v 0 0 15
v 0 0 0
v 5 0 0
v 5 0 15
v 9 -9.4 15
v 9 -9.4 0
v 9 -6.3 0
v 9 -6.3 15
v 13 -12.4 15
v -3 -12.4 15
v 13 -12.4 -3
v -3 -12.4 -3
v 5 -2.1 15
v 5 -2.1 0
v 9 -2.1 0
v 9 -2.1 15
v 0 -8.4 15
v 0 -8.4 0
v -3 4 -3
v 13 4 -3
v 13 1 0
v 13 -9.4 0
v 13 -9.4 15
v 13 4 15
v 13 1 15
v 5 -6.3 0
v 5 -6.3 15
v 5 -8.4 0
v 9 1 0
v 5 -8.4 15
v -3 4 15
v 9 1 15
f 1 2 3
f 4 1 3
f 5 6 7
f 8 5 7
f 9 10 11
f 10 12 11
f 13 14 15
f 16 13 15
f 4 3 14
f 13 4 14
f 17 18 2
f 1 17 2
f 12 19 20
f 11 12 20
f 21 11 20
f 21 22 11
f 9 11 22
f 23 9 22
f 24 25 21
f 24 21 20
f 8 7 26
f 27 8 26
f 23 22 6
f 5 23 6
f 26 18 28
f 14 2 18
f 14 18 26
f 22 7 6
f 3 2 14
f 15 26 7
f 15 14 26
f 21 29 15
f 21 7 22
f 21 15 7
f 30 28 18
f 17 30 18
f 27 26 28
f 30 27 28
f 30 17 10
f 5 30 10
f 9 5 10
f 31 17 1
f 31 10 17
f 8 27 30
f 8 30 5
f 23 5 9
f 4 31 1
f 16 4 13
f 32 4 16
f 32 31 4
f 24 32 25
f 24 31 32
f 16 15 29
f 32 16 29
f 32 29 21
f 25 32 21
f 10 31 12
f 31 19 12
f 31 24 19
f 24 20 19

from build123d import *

# Parameters (mm, degrees)
F0_W     = 3
F0_H     = 8.4
F1_DEPTH = 3
F2_DEPTH = 15


with BuildPart() as f1:
    # F0 (on Top) → F1 (new body)
    with BuildSketch(Plane.XY):
        Polygon((-3, 0), (0, 0), (5, 0), (5, -2.1), (9, -2.1), (9, 1), (13, 1), (13, 4), (-3, 4), align=None)
        with Locations((-1.5, -4.2)):
            Rectangle(F0_W, F0_H)
        Polygon((5, -8.4), (0, -8.4), (-3, -8.4), (-3, -12.4), (13, -12.4), (13, -9.4), (9, -9.4), (9, -6.3), (5, -6.3), align=None)
        Polygon((5, 0), (0, 0), (0, -8.4), (5, -8.4), (5, -6.3), (9, -6.3), (9, -9.4), (13, -9.4), (13, 1), (9, 1), (9, -2.1), (5, -2.1), align=None)
    extrude(amount=-F1_DEPTH)

    # F0 (on Top) → F2 (join)
    with BuildSketch(Plane.XY):
        Polygon((-3, 0), (0, 0), (5, 0), (5, -2.1), (9, -2.1), (9, 1), (13, 1), (13, 4), (-3, 4), align=None)
        Polygon((5, -8.4), (0, -8.4), (-3, -8.4), (-3, -12.4), (13, -12.4), (13, -9.4), (9, -9.4), (9, -6.3), (5, -6.3), align=None)
        with Locations((-1.5, -4.2)):
            Rectangle(F0_W, F0_H)
    extrude(amount=F2_DEPTH)


solid = f1.part
